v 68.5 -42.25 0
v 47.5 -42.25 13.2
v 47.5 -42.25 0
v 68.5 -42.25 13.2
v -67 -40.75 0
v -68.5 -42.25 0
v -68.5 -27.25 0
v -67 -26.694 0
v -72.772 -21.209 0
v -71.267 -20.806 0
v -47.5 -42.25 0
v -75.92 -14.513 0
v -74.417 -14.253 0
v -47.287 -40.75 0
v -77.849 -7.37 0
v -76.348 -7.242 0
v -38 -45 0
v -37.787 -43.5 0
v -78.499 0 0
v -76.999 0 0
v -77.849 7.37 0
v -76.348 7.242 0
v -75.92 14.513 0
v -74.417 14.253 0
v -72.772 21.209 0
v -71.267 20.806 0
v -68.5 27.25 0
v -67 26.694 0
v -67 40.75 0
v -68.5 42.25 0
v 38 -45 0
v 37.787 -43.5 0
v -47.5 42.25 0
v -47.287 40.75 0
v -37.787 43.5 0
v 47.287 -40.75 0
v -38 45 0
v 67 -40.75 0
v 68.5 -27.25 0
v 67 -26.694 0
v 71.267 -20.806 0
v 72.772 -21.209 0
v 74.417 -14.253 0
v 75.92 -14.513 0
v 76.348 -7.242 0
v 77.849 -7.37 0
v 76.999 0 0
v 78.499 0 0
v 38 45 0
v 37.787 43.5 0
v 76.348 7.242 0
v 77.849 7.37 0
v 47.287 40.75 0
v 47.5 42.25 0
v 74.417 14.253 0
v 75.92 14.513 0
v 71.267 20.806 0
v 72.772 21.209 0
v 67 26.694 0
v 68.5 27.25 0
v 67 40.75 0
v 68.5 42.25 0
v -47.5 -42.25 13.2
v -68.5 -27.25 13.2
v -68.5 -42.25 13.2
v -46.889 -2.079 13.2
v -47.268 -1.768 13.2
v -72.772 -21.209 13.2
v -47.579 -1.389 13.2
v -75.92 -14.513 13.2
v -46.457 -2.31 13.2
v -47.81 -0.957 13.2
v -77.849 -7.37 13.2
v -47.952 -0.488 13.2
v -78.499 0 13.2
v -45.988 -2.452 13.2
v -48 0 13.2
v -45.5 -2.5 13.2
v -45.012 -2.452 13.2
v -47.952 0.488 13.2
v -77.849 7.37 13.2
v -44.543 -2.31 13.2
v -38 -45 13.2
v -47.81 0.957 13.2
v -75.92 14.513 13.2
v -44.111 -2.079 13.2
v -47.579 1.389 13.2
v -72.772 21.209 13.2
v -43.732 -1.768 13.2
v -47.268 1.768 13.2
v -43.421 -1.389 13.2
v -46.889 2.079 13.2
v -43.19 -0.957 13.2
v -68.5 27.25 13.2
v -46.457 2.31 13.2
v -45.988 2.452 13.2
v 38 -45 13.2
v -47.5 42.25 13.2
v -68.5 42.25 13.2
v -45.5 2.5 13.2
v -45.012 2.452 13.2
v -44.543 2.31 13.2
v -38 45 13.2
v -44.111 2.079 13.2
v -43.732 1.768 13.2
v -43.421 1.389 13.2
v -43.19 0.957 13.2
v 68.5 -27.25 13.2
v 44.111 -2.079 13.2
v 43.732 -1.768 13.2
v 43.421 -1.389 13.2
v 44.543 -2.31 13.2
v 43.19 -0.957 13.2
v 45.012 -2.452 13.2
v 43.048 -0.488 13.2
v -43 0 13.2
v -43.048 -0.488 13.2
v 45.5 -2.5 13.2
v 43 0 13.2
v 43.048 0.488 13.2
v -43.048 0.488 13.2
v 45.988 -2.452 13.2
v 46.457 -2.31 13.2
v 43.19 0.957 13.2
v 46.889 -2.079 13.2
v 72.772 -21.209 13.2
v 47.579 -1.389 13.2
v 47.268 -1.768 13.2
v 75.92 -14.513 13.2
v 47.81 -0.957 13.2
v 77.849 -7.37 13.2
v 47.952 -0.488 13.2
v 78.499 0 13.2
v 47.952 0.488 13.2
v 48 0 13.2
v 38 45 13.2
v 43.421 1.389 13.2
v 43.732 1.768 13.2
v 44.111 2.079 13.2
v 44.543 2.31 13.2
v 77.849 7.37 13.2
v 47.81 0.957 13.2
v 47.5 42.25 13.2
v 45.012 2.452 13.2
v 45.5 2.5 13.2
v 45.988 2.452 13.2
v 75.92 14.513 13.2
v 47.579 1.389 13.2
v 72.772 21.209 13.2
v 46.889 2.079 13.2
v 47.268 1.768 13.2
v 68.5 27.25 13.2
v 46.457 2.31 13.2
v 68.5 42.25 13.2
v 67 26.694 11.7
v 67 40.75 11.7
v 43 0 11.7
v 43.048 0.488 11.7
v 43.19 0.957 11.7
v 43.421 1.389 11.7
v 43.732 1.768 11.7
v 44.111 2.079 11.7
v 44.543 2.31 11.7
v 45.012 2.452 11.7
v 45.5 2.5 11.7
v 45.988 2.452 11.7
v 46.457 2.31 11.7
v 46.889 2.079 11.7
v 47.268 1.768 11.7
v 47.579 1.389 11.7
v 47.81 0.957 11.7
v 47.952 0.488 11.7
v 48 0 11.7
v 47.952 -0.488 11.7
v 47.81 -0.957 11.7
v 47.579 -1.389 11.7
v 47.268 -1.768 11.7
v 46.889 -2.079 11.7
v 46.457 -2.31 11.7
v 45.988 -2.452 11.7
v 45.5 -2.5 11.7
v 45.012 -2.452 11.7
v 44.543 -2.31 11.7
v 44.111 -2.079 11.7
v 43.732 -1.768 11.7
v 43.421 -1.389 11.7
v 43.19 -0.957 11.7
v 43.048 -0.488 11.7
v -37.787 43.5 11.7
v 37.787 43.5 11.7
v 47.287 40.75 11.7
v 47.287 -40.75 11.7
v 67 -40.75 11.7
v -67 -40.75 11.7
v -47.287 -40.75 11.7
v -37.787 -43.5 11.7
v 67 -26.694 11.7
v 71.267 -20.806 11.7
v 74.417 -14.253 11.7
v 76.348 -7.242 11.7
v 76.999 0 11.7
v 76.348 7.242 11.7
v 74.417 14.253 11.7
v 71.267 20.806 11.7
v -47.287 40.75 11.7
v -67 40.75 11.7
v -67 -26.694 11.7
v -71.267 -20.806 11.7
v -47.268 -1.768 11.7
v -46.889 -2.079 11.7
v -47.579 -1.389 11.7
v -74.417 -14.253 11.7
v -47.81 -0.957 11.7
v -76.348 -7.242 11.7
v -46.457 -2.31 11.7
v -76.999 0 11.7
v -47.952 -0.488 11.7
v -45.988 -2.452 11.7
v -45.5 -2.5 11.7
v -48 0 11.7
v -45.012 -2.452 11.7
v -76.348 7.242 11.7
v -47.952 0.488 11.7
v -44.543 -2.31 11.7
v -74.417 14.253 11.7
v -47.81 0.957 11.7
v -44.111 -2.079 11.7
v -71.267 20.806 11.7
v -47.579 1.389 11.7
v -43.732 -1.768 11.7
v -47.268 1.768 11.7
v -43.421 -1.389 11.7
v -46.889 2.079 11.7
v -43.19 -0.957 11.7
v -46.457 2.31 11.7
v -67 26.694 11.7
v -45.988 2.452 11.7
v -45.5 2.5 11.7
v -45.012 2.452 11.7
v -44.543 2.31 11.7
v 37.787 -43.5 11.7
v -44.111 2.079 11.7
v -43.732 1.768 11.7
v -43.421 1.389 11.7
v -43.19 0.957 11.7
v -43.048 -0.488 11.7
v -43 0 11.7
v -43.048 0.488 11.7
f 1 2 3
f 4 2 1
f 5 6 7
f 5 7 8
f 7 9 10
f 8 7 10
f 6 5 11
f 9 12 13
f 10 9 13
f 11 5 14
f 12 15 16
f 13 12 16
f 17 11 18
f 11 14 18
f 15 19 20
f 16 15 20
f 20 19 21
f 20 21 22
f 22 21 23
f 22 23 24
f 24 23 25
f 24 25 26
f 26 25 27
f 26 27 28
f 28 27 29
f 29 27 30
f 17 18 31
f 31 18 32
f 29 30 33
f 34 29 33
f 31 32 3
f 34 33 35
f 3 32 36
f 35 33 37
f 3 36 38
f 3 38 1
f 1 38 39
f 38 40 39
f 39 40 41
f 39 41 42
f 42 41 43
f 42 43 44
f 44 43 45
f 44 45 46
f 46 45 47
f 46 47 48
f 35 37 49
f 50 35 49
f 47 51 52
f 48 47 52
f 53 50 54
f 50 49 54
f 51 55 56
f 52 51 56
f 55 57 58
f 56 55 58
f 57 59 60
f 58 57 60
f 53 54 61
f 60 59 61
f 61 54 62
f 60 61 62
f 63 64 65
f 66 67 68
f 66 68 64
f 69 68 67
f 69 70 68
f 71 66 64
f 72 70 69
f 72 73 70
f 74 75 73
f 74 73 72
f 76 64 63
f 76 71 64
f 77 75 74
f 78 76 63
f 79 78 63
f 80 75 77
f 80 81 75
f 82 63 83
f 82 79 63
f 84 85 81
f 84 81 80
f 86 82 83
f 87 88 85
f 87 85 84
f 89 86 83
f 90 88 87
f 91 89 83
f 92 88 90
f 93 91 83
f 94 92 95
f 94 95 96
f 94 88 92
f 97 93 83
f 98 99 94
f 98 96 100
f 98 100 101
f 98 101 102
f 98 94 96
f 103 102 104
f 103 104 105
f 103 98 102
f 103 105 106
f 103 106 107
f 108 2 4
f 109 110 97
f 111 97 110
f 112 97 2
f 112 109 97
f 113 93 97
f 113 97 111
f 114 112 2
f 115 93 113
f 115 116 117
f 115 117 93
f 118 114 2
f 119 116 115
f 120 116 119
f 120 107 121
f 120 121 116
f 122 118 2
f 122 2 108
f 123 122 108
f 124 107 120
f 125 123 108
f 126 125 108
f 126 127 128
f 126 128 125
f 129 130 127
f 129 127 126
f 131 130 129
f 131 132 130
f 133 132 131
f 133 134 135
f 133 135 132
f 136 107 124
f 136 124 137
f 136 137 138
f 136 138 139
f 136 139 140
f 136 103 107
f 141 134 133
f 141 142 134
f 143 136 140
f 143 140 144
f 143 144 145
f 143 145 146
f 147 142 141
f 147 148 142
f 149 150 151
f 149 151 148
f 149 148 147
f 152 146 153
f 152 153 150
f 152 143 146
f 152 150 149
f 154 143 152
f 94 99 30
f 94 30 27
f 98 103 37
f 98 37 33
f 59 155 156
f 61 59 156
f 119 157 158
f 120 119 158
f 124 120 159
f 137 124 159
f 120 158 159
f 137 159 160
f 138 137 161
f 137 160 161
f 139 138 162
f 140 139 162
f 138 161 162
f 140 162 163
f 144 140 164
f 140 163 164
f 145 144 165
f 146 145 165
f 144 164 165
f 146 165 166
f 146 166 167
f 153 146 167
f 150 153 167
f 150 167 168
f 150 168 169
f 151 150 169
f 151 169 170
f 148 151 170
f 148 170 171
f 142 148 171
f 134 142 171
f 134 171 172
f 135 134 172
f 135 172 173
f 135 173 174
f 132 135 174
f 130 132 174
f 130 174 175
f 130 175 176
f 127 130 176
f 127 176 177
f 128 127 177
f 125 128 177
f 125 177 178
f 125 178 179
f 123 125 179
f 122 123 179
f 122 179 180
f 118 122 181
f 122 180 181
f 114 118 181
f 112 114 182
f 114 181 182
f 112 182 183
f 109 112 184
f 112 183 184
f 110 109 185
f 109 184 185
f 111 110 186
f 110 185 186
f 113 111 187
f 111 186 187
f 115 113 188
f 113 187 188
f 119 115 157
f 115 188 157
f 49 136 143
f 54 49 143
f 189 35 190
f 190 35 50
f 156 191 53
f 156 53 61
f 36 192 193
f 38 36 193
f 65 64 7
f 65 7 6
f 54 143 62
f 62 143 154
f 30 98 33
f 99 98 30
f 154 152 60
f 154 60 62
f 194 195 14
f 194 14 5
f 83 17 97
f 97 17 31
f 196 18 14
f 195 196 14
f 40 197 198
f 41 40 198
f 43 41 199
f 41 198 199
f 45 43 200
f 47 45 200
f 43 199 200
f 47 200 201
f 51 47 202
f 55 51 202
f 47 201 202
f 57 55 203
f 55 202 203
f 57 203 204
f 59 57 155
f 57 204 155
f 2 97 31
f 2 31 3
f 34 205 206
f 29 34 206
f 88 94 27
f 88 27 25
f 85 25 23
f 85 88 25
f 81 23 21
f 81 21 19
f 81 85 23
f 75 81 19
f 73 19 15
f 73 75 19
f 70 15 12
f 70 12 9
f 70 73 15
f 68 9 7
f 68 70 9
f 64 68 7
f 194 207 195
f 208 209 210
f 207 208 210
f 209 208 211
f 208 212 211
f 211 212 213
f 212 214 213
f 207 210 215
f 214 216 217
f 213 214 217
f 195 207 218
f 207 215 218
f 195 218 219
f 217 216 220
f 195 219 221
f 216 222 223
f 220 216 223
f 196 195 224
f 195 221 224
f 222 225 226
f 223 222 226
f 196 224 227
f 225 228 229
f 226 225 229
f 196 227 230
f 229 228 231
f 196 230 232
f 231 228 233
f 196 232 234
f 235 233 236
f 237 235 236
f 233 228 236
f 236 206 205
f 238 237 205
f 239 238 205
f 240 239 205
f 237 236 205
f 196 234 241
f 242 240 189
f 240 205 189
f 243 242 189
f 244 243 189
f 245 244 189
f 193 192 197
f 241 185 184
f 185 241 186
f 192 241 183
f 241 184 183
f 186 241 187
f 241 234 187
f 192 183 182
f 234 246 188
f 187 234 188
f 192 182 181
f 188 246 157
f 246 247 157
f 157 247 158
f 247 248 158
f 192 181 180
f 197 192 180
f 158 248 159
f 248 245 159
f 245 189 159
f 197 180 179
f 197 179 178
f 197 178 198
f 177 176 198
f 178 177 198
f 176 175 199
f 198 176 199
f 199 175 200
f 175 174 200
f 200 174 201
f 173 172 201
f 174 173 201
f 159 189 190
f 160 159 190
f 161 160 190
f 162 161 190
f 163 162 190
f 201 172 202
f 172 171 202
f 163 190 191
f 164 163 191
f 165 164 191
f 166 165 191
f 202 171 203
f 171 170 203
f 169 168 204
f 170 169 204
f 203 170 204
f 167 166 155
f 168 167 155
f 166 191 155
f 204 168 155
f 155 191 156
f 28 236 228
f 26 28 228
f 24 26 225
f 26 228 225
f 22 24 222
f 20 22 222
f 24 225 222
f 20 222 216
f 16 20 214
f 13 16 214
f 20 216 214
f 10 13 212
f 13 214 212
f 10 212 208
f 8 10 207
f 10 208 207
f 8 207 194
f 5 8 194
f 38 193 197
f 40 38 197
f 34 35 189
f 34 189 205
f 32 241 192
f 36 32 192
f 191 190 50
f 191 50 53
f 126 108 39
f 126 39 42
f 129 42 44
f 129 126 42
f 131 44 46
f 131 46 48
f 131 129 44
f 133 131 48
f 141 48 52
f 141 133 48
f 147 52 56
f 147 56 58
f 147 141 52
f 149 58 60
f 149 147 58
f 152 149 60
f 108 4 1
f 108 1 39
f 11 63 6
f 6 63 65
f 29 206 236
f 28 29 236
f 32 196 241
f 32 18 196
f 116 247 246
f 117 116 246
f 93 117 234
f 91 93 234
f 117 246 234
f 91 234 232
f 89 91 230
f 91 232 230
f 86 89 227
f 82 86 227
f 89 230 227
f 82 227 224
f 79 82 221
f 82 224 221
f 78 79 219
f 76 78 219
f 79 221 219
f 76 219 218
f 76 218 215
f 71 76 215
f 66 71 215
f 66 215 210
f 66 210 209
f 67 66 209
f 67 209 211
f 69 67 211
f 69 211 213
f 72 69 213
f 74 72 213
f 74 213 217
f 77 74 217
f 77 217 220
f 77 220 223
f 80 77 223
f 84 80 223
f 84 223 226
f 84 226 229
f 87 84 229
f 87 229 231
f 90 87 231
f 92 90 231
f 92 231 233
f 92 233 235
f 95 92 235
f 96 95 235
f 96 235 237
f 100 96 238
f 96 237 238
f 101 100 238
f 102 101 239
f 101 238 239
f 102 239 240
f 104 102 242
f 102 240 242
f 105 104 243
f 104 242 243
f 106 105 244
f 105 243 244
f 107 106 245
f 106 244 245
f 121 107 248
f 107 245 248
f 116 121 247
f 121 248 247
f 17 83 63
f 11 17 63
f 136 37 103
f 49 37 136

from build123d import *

# Parameters (mm, degrees)
SKETCH_1_W          = 157
SKETCH_1_H          = 90
EXTRUDE_1_DEPTH     = 13.2
CUT_EXTRUDE_1_DEPTH = 92.441183282
CUT_EXTRUDE_2_DEPTH = 92.441183282
SHELL_1_T           = -1.5
SKETCH_4_R          = 2.5
CUT_EXTRUDE_3_DEPTH = 13.2


with BuildPart() as part:
    # 草图1 → 凸台-拉伸1 (new body)
    with BuildSketch(Plane.XY):
        Rectangle(SKETCH_1_W, SKETCH_1_H)
    extrude(amount=EXTRUDE_1_DEPTH)

    # 草图2 → 切除-拉伸1 (cut, through all)
    with BuildSketch(Plane.XY.offset(13.2)):
        Polygon((-38, 45), (-47.5, 42.25), (-78.5, 42.25), (-78.5, 45), align=None)
        Polygon((78.5, 45), (38, 45), (47.5, 42.25), (78.5, 42.25), align=None)
        Polygon((38, -45), (47.5, -42.25), (78.5, -42.25), (78.5, -45), align=None)
        Polygon((-78.5, -45), (-38, -45), (-47.5, -42.25), (-78.5, -42.25), align=None)
    extrude(amount=-CUT_EXTRUDE_1_DEPTH, mode=Mode.SUBTRACT)

    # 草图3 → 切除-拉伸2 (cut, through all)
    with BuildSketch(Plane.XY.offset(13.2)):
        with BuildLine():
            Line((-68.5, 42.25), (-68.5, 27.25))
            ThreePointArc((-68.5, 27.25), (-78.499, 0), (-68.5, -27.25))
            Line((-68.5, -27.25), (-68.5, -42.25))
            Line((-68.5, -42.25), (-78.5, -42.25))
            Line((-78.5, -42.25), (-78.5, 42.25))
            Line((-78.5, 42.25), (-68.5, 42.25))
        make_face()
        with BuildLine():
            Line((68.5, -42.25), (68.5, -27.25))
            ThreePointArc((68.5, -27.25), (78.499, 0), (68.5, 27.25))
            Line((68.5, 27.25), (68.5, 42.25))
            Line((68.5, 42.25), (78.5, 42.25))
            Line((78.5, 42.25), (78.5, -42.25))
            Line((78.5, -42.25), (68.5, -42.25))
        make_face()
    extrude(amount=-CUT_EXTRUDE_2_DEPTH, mode=Mode.SUBTRACT)

    # 抽壳1
    shell_1_openings = [part.faces().sort_by_distance(p)[0] for p in [
        (0, 0, 0),
    ]]
    offset(amount=SHELL_1_T, openings=shell_1_openings, kind=Kind.INTERSECTION)

    # 草图4 → 切除-拉伸3 (cut)
    with BuildSketch(Plane(origin=(0, 0, 0), x_dir=(-1, 0, 0), z_dir=(0, 0, -1))):
        with Locations((-45.5, 0)):
            Circle(SKETCH_4_R)
        with Locations(Location((45.5, 0, 0), (0, 0, 180))):
            Circle(SKETCH_4_R)
    extrude(amount=-CUT_EXTRUDE_3_DEPTH, mode=Mode.SUBTRACT)


solid = part.part
